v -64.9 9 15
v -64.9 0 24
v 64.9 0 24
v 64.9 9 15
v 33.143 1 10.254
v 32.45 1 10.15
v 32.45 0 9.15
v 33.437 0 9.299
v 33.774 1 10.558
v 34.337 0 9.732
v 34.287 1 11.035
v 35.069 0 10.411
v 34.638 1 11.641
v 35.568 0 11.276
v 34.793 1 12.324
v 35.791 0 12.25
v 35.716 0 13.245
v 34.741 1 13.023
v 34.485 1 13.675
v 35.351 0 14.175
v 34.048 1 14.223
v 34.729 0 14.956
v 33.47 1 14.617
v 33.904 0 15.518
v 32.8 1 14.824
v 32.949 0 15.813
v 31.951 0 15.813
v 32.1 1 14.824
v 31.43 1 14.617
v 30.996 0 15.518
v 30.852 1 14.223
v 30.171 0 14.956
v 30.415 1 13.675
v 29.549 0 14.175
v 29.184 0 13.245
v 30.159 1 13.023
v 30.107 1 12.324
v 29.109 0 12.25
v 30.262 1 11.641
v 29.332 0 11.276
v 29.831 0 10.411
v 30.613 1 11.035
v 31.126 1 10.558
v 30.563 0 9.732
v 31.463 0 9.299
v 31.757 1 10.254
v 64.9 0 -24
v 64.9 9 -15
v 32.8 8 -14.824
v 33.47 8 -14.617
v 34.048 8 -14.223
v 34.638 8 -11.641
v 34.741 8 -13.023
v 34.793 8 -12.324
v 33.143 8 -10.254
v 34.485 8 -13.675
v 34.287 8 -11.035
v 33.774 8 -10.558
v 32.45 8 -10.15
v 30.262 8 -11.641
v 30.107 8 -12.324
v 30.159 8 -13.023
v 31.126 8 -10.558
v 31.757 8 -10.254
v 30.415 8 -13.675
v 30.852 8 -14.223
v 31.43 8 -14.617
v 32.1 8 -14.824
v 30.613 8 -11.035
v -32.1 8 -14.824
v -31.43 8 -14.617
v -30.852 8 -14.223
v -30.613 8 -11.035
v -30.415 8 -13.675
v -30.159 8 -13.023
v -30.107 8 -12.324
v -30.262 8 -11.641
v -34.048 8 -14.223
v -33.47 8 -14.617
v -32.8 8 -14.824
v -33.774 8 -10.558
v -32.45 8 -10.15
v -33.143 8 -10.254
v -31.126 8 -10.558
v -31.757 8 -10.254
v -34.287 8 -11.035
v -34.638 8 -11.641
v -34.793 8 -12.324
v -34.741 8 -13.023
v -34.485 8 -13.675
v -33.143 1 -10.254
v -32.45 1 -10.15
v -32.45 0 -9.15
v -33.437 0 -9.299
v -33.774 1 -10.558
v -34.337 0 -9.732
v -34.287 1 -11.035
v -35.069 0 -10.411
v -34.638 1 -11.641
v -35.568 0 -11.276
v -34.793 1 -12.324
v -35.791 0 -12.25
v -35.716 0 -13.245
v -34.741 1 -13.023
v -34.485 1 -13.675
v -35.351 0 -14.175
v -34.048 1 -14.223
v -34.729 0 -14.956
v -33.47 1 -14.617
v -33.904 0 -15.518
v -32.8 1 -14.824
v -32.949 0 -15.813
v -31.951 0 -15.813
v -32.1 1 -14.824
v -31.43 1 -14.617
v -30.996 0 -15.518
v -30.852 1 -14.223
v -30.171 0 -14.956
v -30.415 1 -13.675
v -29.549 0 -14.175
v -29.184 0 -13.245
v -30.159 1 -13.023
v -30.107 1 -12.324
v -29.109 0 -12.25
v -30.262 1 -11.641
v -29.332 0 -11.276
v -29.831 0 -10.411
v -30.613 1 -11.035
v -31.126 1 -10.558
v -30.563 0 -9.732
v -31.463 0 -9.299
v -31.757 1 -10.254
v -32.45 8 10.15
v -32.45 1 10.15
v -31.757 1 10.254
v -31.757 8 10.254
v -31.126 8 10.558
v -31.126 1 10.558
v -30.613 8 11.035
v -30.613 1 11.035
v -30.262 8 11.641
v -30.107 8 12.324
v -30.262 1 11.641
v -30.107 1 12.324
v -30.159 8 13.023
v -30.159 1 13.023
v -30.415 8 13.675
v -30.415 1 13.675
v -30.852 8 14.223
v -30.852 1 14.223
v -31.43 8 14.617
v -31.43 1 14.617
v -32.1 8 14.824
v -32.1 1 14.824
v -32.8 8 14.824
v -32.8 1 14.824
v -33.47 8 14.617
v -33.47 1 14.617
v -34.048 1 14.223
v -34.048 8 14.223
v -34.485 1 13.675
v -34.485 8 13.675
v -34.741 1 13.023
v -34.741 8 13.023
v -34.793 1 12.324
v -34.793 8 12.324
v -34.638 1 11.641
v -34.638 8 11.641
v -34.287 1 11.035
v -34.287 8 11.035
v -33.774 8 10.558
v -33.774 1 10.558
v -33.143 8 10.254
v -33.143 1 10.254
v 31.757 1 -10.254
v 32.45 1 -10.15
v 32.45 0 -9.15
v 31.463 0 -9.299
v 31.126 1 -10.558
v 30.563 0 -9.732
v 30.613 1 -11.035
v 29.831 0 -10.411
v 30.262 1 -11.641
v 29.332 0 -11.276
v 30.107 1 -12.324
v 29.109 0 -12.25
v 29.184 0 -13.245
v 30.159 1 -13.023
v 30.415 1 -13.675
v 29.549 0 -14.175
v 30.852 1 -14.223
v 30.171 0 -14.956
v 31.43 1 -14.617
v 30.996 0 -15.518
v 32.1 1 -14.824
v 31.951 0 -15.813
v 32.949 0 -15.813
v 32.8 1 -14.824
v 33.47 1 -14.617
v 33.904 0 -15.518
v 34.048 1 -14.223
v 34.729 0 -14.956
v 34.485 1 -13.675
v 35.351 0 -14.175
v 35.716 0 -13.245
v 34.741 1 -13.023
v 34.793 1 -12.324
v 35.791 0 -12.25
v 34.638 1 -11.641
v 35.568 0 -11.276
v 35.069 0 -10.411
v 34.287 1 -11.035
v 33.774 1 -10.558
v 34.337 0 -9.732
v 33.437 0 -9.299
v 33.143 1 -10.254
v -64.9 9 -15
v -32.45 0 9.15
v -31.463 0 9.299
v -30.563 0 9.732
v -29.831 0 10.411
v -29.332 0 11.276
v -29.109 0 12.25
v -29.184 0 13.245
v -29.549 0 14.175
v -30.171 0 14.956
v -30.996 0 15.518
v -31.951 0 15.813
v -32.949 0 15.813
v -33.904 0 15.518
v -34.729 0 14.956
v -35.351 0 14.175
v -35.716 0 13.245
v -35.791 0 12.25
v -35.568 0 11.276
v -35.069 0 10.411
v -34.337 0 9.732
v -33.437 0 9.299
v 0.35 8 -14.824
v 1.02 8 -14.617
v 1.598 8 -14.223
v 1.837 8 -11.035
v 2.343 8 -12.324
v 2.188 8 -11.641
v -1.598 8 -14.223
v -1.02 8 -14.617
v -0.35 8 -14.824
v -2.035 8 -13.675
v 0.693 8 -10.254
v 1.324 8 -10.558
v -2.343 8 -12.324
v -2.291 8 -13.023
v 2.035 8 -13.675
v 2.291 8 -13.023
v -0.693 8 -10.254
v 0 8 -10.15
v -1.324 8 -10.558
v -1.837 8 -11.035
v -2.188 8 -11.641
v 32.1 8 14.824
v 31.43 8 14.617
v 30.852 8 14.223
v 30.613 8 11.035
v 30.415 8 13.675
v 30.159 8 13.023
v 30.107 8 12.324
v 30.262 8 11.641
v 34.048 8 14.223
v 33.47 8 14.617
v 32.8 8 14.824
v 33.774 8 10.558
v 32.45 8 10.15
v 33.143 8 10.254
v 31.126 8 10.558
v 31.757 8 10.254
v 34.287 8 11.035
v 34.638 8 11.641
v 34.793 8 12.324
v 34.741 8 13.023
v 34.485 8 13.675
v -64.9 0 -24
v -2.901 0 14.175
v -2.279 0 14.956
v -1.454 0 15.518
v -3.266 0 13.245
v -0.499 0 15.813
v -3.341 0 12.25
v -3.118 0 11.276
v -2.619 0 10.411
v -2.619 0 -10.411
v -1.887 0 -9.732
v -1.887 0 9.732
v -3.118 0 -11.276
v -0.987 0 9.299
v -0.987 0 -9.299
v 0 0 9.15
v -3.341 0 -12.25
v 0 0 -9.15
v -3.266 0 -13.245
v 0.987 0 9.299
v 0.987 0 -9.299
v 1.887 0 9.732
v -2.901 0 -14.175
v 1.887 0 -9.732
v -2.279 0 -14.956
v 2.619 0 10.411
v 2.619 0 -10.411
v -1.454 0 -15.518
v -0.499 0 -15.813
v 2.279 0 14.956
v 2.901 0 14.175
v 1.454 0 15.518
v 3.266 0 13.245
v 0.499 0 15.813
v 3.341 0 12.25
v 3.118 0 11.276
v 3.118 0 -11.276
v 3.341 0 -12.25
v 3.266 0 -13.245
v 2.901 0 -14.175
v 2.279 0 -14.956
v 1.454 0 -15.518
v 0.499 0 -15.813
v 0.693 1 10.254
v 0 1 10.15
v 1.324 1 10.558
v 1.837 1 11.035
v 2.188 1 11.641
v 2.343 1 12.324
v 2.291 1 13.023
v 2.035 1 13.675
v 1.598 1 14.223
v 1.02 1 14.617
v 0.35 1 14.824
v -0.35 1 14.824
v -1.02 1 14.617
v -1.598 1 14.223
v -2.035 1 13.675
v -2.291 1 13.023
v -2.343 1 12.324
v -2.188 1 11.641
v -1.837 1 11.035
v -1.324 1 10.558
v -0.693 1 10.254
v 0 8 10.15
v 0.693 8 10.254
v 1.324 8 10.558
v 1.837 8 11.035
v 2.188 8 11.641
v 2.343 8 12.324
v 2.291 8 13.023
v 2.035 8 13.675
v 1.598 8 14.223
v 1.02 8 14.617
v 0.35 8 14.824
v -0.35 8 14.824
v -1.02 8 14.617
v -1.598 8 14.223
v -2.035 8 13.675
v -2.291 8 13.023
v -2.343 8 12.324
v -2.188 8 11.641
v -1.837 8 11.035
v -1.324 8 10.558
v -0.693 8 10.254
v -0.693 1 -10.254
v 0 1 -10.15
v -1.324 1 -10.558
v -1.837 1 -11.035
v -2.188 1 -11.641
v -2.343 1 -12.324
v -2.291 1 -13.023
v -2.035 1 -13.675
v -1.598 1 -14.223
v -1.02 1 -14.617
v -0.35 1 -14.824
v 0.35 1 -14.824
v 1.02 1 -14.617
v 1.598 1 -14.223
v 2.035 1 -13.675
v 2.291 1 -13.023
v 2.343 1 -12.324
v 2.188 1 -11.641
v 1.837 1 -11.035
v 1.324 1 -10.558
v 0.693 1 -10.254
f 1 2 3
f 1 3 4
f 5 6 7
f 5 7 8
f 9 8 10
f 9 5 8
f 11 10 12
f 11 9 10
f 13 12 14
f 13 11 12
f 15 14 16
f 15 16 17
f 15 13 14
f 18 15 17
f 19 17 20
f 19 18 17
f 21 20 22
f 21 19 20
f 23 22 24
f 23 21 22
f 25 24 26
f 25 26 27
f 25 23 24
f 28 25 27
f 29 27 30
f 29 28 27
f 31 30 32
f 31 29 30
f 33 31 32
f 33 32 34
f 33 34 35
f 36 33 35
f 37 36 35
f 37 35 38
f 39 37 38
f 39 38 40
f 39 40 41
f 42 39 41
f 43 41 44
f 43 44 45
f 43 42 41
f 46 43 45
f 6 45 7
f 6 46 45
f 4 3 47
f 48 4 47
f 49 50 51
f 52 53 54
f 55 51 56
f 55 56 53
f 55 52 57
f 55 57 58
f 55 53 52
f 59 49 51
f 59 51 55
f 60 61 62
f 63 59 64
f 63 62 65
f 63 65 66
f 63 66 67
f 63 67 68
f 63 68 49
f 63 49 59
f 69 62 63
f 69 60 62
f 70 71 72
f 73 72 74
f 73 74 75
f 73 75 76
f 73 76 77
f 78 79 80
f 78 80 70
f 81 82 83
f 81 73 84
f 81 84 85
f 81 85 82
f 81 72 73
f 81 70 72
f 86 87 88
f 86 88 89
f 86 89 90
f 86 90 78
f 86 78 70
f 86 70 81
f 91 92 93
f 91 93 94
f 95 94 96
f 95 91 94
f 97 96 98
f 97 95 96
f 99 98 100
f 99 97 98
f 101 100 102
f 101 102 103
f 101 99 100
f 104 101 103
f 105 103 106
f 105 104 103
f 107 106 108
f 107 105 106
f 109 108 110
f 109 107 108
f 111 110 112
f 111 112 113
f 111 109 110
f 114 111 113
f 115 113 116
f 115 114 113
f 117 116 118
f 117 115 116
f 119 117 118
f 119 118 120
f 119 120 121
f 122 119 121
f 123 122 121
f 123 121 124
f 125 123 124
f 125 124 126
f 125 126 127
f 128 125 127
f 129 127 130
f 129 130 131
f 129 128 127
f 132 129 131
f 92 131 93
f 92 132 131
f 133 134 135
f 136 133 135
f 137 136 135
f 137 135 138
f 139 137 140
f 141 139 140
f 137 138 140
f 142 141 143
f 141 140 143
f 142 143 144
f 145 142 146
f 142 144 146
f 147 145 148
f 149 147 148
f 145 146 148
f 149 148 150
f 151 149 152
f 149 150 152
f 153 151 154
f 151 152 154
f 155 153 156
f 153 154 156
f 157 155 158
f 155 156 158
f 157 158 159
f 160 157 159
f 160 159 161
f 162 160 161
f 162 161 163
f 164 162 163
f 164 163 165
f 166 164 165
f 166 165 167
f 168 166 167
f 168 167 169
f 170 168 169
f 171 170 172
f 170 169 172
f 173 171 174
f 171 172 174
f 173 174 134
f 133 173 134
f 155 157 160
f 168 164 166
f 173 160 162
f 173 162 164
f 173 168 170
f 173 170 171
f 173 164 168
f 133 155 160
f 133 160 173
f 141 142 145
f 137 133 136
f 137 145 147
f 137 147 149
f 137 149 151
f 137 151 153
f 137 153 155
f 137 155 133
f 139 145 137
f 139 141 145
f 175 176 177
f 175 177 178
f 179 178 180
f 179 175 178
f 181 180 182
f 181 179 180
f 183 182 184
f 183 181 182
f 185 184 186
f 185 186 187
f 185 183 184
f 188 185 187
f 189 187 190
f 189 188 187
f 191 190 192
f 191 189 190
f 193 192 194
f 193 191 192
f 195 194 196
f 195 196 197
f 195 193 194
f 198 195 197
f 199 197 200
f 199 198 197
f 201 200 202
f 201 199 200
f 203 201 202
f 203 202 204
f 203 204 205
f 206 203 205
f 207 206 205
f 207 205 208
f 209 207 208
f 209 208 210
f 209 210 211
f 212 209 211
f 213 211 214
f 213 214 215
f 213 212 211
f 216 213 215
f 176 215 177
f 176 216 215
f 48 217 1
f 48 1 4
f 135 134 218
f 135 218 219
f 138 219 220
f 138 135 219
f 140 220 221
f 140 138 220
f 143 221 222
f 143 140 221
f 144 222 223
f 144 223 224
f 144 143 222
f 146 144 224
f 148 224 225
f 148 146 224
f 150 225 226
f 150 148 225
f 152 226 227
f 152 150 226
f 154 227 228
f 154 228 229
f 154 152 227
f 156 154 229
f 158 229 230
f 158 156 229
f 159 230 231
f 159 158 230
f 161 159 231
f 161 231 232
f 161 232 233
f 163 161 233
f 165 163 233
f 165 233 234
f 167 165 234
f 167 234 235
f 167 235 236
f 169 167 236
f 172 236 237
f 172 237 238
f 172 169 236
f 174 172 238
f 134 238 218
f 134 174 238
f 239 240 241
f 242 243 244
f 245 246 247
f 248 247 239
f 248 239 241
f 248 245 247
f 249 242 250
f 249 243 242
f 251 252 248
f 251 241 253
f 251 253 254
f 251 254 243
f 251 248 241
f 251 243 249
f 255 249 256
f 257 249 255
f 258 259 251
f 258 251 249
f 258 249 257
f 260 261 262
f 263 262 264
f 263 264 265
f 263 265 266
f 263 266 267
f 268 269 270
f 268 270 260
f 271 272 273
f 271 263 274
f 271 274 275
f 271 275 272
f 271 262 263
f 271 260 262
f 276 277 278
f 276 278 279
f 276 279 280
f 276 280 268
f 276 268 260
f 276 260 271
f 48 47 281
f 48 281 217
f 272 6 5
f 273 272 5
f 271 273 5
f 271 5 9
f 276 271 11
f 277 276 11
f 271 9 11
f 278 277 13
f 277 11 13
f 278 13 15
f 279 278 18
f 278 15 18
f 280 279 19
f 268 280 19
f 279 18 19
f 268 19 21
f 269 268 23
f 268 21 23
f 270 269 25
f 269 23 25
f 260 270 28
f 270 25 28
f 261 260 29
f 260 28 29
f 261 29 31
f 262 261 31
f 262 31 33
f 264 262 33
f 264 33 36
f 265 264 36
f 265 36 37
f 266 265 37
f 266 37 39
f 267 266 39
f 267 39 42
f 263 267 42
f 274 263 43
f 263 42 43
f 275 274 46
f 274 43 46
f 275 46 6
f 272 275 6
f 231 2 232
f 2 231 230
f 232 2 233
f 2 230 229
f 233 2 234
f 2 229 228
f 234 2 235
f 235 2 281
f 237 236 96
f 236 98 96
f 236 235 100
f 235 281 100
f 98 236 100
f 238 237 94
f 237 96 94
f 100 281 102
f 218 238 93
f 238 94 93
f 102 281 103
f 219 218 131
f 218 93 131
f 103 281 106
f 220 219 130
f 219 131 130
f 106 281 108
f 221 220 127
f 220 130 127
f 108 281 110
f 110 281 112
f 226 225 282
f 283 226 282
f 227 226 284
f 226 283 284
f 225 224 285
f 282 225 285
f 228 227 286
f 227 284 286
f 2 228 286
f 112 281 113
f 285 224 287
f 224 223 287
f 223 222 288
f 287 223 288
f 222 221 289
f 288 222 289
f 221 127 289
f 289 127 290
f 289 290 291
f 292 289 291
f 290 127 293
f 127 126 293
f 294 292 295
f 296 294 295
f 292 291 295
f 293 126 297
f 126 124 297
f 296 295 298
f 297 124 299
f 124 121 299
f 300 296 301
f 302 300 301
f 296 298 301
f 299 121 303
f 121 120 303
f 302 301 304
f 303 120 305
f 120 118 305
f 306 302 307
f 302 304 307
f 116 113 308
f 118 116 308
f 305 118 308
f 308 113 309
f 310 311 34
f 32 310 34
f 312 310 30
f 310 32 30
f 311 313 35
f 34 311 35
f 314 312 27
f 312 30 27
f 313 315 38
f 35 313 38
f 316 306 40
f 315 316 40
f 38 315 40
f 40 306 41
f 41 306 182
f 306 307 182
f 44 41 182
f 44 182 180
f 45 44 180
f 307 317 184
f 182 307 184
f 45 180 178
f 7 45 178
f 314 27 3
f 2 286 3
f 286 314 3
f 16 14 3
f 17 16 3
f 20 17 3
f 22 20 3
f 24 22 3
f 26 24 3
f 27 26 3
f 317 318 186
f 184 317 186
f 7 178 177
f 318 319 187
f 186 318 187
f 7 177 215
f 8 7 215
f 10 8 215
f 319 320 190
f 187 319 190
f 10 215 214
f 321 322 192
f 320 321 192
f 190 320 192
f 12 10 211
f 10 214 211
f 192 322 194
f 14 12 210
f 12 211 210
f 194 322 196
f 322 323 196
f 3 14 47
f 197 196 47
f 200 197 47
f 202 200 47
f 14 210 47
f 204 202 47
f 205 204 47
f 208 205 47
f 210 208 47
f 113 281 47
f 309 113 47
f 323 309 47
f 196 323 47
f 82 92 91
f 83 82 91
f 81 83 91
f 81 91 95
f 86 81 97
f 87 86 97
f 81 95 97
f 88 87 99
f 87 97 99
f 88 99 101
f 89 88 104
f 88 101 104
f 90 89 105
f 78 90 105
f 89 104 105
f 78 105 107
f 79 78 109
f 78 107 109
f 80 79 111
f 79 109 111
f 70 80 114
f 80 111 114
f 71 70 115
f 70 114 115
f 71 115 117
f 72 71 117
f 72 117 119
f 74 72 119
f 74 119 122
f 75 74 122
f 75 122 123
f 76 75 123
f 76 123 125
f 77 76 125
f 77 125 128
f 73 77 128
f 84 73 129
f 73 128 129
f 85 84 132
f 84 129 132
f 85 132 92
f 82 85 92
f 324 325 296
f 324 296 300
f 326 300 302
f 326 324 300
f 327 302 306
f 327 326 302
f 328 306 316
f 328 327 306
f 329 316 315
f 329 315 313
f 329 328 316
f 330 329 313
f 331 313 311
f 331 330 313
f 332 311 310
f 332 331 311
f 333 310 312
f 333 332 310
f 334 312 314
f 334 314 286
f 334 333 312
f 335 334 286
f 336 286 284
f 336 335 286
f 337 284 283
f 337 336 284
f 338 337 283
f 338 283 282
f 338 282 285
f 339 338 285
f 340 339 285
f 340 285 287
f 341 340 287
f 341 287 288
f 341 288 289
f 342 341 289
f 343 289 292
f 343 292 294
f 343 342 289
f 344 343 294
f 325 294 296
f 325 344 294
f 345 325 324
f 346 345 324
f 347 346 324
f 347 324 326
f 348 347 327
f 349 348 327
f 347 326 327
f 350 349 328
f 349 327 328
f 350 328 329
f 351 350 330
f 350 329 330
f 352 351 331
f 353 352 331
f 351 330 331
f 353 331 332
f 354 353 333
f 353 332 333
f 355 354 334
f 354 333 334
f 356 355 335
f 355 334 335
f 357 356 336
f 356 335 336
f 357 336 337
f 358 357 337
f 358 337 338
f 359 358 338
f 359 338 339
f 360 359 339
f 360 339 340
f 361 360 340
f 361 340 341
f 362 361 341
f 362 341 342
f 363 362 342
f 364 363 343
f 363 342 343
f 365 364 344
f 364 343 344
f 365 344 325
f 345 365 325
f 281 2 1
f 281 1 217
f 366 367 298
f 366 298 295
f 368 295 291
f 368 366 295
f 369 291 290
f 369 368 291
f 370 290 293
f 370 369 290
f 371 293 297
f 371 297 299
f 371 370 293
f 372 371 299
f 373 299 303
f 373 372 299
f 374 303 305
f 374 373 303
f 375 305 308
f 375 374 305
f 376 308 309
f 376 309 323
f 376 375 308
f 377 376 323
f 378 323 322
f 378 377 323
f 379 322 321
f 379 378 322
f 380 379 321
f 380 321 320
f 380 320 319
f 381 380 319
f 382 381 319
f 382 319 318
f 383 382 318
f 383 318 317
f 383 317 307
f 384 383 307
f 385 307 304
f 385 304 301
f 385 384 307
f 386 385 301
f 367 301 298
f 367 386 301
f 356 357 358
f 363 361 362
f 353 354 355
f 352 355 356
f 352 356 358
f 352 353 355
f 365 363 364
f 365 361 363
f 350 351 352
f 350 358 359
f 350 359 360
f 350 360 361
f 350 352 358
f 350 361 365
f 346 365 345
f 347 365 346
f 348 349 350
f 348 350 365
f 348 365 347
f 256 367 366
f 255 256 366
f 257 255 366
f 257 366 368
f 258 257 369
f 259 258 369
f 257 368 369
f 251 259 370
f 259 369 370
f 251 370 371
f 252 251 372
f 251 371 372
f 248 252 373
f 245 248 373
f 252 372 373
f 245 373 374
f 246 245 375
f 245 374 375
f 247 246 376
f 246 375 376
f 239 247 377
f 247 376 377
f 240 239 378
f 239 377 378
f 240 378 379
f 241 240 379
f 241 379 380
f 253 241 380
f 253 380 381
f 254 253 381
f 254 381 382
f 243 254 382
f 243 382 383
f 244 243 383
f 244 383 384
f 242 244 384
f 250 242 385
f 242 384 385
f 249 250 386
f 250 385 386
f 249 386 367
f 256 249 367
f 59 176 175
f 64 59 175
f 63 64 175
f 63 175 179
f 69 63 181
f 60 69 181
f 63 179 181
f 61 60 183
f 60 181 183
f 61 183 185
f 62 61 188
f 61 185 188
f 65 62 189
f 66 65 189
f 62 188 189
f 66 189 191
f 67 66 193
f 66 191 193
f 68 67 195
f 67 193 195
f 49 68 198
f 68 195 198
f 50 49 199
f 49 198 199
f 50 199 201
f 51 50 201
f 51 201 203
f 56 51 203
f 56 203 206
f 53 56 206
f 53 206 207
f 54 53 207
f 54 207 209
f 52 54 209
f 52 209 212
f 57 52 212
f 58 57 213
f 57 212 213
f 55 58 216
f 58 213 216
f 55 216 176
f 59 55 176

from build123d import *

# Parameters (mm, degrees)
SKETCH1_W           = 129.8
SKETCH1_H           = 50
BOSS_EXTRUDE1_DEPTH = 9
SKETCH2_R           = 2.35
CUT_EXTRUDE1_DEPTH  = 8
CHAMFER1_SIZE       = 1
CHAMFER2_SIZE       = 10


with BuildPart() as part:
    # Sketch1 → Boss-Extrude1 (new body)
    with BuildSketch(Plane(origin=(0, 0, 0), x_dir=(1, 0, 0), z_dir=(0, 1, 0))):
        Rectangle(SKETCH1_W, SKETCH1_H)
    extrude(amount=BOSS_EXTRUDE1_DEPTH)

    # Sketch2 → Cut-Extrude1 (cut)
    with BuildSketch(Plane.XZ):
        with Locations(Location((-32.45, 12.5, 0), (0, 0, 270))):
            Circle(SKETCH2_R)
        with Locations(Location((0, 12.5, 0), (0, 0, 270))):
            Circle(SKETCH2_R)
        with Locations(Location((32.45, 12.5, 0), (0, 0, 270))):
            Circle(SKETCH2_R)
        with Locations(Location((32.45, -12.5, 0), (0, 0, 90))):
            Circle(SKETCH2_R)
        with Locations(Location((0, -12.5, 0), (0, 0, 90))):
            Circle(SKETCH2_R)
        with Locations(Location((-32.45, -12.5, 0), (0, 0, 90))):
            Circle(SKETCH2_R)
    extrude(amount=-CUT_EXTRUDE1_DEPTH, mode=Mode.SUBTRACT)

    # Chamfer1
    chamfer1_edges = [part.edges().sort_by_distance(p)[0] for p in [
        (-32.45, 0, -14.85),
        (0, 0, -14.85),
        (32.45, 0, -14.85),
        (32.45, 0, 14.85),
        (0, 0, 14.85),
        (-32.45, 0, 14.85),
    ]]
    chamfer(chamfer1_edges, length=CHAMFER1_SIZE)

    # Chamfer2
    # the kernel refuses this chamfer: 10 mm, written as the material it takes off along each edge
    with BuildSketch(Plane(origin=(90.61682988, 9, 25), x_dir=(0, -0.9996219169112968, 0.027495876610586317), z_dir=(-1, 0, 0)), Plane(origin=(-90.61682988, 9, -25), x_dir=(0, -0.9996219169112968, -0.027495876610586317), z_dir=(1, 0, 0))) as chamfer2_piece_1:
        Polygon((CHAMFER2_SIZE * 0.999621916911, -CHAMFER2_SIZE * 0.0274958766106), (-CHAMFER2_SIZE * 0.0274958766106, -CHAMFER2_SIZE * 0.999621916911), (0, 0), align=None)
    extrude(amount=181.233659759, mode=Mode.SUBTRACT)


solid = part.part
